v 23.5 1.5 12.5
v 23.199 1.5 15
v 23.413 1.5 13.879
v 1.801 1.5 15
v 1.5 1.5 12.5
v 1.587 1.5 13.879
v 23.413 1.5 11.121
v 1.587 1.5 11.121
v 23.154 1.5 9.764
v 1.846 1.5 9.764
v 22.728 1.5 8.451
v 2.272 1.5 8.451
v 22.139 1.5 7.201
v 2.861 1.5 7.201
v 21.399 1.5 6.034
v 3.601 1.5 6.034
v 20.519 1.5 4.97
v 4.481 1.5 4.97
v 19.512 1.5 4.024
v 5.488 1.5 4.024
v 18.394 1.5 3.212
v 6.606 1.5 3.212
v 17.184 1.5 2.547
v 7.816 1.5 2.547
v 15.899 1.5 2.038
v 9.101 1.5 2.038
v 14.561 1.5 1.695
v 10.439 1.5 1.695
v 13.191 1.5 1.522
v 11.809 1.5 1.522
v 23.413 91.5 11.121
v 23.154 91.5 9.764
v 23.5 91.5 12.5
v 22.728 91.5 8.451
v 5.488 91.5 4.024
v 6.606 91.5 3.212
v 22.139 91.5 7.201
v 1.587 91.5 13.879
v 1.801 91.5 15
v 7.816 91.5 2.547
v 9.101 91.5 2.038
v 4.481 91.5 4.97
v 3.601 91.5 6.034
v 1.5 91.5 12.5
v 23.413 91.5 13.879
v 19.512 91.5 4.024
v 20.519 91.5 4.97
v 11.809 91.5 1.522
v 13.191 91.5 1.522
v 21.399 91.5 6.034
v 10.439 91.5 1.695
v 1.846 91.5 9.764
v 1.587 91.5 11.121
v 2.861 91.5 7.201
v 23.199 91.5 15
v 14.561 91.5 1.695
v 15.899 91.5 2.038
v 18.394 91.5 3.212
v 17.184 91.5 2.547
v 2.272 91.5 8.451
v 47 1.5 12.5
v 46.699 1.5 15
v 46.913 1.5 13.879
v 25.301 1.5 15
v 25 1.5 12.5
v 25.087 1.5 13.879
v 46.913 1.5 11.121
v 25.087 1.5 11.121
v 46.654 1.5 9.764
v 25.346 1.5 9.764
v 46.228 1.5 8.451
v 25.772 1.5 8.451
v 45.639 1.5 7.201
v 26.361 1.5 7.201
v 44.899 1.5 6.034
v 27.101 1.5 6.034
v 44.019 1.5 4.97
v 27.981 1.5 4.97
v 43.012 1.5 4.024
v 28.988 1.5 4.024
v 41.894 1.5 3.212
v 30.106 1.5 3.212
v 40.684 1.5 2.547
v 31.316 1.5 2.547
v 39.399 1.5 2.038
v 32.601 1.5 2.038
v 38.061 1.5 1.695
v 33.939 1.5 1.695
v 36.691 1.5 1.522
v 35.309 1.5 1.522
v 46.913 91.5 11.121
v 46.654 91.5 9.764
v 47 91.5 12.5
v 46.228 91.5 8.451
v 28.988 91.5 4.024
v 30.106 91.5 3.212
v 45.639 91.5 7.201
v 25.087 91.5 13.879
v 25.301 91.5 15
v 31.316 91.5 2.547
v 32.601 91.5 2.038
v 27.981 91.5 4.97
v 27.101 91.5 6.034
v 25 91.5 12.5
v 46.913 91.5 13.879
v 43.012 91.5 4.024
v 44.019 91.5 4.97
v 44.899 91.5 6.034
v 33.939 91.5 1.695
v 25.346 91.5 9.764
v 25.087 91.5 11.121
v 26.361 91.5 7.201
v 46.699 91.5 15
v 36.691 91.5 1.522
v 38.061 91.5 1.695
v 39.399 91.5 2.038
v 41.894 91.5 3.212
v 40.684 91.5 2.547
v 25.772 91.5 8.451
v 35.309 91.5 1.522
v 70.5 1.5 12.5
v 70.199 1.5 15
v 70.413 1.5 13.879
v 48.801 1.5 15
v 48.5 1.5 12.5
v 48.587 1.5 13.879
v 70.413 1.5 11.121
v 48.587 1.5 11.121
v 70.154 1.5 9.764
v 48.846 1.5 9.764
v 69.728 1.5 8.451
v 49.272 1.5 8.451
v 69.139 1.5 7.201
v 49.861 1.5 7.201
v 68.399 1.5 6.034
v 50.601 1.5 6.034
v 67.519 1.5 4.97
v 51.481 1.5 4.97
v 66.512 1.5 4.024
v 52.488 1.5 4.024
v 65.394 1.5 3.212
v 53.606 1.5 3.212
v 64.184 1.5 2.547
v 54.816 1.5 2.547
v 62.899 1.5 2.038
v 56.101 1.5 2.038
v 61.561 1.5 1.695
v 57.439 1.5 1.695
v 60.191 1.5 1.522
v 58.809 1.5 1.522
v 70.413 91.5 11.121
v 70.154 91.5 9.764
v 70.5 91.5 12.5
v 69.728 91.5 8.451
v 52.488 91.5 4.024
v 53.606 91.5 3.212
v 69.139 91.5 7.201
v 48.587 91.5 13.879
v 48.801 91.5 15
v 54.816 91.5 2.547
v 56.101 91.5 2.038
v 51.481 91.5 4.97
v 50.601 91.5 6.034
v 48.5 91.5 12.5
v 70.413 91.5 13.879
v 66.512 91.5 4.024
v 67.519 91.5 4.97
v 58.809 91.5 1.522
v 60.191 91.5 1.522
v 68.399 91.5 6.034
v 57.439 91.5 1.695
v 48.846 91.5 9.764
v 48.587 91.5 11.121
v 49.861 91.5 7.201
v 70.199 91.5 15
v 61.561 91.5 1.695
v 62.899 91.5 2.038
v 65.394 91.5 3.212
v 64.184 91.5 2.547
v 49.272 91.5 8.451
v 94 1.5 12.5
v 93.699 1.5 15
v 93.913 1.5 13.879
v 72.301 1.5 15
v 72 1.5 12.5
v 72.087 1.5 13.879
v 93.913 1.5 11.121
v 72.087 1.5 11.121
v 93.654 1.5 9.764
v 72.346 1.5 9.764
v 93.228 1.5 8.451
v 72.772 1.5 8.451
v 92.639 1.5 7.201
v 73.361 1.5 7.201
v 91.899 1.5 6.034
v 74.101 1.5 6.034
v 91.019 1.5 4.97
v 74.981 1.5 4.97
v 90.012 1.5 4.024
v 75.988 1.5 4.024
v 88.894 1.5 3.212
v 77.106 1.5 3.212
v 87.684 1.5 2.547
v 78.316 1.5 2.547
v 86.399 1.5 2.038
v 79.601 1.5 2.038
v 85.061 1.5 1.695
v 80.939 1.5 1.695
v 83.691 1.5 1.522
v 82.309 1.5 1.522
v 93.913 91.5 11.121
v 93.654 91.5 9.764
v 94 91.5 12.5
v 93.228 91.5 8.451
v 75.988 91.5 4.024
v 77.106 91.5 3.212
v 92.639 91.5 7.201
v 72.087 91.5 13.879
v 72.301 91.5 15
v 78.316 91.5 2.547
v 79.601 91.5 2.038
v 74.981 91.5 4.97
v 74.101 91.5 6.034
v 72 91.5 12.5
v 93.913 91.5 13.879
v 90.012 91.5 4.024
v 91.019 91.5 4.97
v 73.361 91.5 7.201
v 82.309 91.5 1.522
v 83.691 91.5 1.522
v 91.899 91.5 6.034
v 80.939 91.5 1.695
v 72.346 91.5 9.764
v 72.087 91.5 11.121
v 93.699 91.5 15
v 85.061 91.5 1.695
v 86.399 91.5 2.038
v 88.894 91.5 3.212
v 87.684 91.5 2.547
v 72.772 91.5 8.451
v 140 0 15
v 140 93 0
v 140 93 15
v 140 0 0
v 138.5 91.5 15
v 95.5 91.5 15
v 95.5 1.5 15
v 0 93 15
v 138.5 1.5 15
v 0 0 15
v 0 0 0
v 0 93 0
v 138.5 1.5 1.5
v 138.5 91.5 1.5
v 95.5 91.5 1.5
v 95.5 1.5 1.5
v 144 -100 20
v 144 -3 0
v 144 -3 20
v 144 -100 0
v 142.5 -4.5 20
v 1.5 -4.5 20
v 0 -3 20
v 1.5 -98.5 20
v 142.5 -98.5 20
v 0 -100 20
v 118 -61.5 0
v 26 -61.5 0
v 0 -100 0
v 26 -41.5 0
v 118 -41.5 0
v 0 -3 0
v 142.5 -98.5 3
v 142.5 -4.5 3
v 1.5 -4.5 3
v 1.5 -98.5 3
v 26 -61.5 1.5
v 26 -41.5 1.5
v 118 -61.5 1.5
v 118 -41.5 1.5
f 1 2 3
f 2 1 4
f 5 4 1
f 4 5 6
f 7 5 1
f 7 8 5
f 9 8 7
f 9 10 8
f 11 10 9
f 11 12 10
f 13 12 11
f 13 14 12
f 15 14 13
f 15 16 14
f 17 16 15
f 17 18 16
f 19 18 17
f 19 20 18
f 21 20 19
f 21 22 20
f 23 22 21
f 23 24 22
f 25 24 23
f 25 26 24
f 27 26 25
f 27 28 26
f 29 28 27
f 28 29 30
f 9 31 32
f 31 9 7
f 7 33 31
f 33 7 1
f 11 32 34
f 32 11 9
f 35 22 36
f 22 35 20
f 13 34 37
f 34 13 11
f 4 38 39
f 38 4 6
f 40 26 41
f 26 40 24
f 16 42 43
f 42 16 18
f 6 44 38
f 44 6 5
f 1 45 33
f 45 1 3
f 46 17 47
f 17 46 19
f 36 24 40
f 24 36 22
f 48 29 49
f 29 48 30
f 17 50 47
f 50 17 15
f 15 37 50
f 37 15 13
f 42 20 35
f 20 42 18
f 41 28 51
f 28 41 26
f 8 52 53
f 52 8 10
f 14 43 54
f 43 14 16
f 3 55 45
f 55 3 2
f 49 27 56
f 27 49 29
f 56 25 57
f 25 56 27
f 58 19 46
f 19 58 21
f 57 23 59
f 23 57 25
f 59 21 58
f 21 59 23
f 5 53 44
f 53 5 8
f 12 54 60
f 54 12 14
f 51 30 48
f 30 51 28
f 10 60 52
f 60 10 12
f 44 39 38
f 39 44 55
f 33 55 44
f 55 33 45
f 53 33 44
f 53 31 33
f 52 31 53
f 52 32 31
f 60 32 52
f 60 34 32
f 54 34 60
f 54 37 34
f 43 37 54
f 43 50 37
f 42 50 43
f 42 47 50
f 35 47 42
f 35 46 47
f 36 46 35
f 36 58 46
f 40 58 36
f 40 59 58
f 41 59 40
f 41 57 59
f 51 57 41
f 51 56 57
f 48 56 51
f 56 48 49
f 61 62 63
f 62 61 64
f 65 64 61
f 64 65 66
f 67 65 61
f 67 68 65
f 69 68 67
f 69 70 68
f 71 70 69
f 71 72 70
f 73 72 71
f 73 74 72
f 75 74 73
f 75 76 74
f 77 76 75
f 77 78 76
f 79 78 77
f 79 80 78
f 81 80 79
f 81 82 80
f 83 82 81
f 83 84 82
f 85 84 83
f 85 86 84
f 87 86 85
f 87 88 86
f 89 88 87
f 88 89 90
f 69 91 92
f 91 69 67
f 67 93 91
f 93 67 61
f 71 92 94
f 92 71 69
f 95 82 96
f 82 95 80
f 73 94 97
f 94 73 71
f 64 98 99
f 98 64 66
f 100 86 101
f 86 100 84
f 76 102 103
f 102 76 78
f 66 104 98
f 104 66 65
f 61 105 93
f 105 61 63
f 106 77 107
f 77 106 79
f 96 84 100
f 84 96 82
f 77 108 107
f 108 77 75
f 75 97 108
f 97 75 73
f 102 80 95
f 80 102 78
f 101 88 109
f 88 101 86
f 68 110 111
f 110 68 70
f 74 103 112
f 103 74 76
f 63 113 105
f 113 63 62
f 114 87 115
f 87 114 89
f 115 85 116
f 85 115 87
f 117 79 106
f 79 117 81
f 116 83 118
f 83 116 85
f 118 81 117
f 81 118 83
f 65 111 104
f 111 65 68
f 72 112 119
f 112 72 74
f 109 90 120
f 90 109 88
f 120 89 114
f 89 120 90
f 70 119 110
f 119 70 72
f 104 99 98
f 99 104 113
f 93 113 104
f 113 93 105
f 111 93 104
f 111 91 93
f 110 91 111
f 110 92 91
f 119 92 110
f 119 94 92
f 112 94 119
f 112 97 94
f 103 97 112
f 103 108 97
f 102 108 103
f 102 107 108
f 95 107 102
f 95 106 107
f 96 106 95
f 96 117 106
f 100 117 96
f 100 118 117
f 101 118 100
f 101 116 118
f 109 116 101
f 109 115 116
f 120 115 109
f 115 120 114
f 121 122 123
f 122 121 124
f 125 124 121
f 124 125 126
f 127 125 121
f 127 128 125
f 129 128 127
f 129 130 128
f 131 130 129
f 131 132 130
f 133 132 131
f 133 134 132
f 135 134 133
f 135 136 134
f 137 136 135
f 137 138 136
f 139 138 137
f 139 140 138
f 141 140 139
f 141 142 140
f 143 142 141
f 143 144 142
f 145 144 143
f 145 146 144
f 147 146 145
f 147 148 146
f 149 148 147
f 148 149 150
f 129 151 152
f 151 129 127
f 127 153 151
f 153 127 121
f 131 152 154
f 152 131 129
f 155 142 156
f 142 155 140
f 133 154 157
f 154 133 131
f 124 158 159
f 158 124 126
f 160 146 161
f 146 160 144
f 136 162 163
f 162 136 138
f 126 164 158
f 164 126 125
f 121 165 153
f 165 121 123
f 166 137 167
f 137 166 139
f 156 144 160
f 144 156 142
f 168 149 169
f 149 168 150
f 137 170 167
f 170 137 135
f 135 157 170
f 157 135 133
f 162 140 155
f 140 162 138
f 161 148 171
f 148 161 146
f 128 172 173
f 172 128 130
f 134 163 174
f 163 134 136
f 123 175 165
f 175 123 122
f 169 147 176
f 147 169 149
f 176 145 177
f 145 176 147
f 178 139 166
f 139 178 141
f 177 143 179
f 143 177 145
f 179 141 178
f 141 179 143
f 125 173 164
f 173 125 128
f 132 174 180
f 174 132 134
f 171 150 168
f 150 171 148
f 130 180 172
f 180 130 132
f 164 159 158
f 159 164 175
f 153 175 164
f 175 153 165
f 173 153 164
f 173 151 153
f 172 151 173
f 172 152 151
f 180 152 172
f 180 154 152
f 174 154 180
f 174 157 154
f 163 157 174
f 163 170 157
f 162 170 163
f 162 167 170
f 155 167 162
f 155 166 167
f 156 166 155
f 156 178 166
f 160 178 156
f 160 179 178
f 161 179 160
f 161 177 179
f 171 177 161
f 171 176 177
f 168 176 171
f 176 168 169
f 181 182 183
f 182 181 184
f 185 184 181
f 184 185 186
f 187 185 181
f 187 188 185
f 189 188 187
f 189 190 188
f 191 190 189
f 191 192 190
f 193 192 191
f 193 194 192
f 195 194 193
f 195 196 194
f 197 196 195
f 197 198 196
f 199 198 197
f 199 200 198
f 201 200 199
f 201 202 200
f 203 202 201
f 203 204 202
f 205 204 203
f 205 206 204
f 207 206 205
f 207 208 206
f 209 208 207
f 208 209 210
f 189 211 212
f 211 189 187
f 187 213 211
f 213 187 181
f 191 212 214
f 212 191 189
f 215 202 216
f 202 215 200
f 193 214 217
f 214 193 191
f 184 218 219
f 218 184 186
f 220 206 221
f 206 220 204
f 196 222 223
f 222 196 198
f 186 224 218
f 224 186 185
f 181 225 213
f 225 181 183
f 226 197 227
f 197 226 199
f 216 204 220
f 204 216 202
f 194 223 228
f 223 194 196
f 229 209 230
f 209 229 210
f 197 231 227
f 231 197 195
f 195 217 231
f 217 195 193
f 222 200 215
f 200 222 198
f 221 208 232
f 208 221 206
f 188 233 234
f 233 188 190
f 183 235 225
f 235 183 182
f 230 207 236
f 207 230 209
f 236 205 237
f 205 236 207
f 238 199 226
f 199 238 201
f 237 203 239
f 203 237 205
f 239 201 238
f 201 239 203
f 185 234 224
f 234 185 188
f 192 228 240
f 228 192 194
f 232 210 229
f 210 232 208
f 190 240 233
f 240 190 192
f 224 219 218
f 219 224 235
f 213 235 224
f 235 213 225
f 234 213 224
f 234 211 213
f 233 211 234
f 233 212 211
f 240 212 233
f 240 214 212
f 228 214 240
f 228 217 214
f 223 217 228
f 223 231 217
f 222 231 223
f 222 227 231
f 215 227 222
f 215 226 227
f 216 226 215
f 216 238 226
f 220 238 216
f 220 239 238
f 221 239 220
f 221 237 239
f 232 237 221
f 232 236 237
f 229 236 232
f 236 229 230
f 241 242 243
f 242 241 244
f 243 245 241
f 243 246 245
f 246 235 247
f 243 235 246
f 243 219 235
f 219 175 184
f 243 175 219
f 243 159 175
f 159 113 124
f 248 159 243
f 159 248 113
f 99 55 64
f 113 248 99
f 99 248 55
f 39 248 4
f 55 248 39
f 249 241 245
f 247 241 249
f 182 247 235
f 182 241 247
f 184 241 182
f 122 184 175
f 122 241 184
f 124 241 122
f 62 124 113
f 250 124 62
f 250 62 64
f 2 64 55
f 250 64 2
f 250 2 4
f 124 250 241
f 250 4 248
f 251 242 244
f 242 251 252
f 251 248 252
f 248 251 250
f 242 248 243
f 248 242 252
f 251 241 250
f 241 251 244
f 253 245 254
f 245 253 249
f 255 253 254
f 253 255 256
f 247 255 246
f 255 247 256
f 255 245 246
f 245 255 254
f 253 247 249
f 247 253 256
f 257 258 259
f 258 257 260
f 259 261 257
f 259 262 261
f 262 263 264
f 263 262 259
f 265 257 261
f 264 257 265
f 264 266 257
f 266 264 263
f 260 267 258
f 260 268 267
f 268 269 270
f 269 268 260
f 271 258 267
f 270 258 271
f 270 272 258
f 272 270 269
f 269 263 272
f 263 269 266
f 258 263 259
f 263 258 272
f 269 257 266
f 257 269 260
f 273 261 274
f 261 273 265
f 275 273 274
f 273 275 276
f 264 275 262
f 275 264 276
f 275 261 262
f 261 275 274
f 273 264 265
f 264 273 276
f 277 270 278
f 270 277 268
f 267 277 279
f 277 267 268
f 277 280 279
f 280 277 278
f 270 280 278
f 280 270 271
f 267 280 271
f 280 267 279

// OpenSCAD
choke_len = 90.0;
choke_d = 22.0;
choke_space = 1.5;

box_outer_l = 140.0;
box_height = 15.0;
wall_thick = 1.5;
spacer = 0.5;

box_outer_w = choke_len + 2*wall_thick;

$fn = 50;

// ------ Choker Holder Bottom ----------
union(){
    difference(){
        cube([box_outer_l, box_outer_w, box_height], center = false);
        for (i = [0 : 3]){
            translate([wall_thick + choke_d / 2.0 + i * (choke_d + choke_space), wall_thick, wall_thick + choke_d / 2.0]){
                rotate([-90, 0, 0]) {
                    cylinder(h = choke_len, r = choke_d / 2.0, center = false);
                }
            }
        }
        left_square_bin = wall_thick + 4 * (choke_d + choke_space);
        translate([left_square_bin, wall_thick, wall_thick]){
            cube([box_outer_l - wall_thick - left_square_bin, choke_len, choke_d], center = false);
        }
    }
    translate([120, box_outer_w / 2.0, wall_thick]) {
        rotate([0, 0, -90])
        //color("green")
        scale([.15, .15, .05]) 
            surface("c:/repositories/3d-modeling/beretta-png-logo-smaller.png", center = true, invert = false);
    }
}

offset_w = -100.0;
x_inset_border = 26.0;
y_inset_border = 38.5;

// ------ Box Top ----------
union() {
    difference(){
        translate([0, offset_w, 0]) {
            cube([box_outer_l + 2 * wall_thick + 2 * spacer,
                  box_outer_w + 2 * wall_thick + 2 * spacer,
                  box_height + 5.0], center = false);
        }
        translate([wall_thick, offset_w + wall_thick, 2*wall_thick]){
            cube([box_outer_l + 2 * spacer,
                  box_outer_w + 2 * spacer,
                  box_height + 10.0], center = false);
        }
        translate([x_inset_border, 
                   offset_w + box_outer_w + 2 * wall_thick + 2 * spacer - y_inset_border, 
                   wall_thick]) {
            rotate([180, 0, 0])
            cube([box_outer_l + 2 * wall_thick + 2 * spacer - 2 * x_inset_border, 
                  box_outer_w + 2 * wall_thick + 2 * spacer - 2 * y_inset_border, 
                  10], center = false);
        }
    }
    translate([(box_outer_l + 2 * wall_thick + 2 * spacer) / 2.0, 
                offset_w + (box_outer_w + 2*wall_thick + 2*spacer) / 2.0, 
                0]) {
        rotate([180, 0, 0])
        //color("green")
        // .1 is too much, 0.05, 0.06 not enough, 0.07 no, 0.08 no, 0.09 no
        //scale([.2, .2, 0.07])
        // pixels are 463 x 100
        resize([92.6, 20, wall_thick+0.5])
            surface("c:/repositories/3d-modeling/beretta-png-logo-smaller.png", 
                    center = true, invert = true);
    }
}
